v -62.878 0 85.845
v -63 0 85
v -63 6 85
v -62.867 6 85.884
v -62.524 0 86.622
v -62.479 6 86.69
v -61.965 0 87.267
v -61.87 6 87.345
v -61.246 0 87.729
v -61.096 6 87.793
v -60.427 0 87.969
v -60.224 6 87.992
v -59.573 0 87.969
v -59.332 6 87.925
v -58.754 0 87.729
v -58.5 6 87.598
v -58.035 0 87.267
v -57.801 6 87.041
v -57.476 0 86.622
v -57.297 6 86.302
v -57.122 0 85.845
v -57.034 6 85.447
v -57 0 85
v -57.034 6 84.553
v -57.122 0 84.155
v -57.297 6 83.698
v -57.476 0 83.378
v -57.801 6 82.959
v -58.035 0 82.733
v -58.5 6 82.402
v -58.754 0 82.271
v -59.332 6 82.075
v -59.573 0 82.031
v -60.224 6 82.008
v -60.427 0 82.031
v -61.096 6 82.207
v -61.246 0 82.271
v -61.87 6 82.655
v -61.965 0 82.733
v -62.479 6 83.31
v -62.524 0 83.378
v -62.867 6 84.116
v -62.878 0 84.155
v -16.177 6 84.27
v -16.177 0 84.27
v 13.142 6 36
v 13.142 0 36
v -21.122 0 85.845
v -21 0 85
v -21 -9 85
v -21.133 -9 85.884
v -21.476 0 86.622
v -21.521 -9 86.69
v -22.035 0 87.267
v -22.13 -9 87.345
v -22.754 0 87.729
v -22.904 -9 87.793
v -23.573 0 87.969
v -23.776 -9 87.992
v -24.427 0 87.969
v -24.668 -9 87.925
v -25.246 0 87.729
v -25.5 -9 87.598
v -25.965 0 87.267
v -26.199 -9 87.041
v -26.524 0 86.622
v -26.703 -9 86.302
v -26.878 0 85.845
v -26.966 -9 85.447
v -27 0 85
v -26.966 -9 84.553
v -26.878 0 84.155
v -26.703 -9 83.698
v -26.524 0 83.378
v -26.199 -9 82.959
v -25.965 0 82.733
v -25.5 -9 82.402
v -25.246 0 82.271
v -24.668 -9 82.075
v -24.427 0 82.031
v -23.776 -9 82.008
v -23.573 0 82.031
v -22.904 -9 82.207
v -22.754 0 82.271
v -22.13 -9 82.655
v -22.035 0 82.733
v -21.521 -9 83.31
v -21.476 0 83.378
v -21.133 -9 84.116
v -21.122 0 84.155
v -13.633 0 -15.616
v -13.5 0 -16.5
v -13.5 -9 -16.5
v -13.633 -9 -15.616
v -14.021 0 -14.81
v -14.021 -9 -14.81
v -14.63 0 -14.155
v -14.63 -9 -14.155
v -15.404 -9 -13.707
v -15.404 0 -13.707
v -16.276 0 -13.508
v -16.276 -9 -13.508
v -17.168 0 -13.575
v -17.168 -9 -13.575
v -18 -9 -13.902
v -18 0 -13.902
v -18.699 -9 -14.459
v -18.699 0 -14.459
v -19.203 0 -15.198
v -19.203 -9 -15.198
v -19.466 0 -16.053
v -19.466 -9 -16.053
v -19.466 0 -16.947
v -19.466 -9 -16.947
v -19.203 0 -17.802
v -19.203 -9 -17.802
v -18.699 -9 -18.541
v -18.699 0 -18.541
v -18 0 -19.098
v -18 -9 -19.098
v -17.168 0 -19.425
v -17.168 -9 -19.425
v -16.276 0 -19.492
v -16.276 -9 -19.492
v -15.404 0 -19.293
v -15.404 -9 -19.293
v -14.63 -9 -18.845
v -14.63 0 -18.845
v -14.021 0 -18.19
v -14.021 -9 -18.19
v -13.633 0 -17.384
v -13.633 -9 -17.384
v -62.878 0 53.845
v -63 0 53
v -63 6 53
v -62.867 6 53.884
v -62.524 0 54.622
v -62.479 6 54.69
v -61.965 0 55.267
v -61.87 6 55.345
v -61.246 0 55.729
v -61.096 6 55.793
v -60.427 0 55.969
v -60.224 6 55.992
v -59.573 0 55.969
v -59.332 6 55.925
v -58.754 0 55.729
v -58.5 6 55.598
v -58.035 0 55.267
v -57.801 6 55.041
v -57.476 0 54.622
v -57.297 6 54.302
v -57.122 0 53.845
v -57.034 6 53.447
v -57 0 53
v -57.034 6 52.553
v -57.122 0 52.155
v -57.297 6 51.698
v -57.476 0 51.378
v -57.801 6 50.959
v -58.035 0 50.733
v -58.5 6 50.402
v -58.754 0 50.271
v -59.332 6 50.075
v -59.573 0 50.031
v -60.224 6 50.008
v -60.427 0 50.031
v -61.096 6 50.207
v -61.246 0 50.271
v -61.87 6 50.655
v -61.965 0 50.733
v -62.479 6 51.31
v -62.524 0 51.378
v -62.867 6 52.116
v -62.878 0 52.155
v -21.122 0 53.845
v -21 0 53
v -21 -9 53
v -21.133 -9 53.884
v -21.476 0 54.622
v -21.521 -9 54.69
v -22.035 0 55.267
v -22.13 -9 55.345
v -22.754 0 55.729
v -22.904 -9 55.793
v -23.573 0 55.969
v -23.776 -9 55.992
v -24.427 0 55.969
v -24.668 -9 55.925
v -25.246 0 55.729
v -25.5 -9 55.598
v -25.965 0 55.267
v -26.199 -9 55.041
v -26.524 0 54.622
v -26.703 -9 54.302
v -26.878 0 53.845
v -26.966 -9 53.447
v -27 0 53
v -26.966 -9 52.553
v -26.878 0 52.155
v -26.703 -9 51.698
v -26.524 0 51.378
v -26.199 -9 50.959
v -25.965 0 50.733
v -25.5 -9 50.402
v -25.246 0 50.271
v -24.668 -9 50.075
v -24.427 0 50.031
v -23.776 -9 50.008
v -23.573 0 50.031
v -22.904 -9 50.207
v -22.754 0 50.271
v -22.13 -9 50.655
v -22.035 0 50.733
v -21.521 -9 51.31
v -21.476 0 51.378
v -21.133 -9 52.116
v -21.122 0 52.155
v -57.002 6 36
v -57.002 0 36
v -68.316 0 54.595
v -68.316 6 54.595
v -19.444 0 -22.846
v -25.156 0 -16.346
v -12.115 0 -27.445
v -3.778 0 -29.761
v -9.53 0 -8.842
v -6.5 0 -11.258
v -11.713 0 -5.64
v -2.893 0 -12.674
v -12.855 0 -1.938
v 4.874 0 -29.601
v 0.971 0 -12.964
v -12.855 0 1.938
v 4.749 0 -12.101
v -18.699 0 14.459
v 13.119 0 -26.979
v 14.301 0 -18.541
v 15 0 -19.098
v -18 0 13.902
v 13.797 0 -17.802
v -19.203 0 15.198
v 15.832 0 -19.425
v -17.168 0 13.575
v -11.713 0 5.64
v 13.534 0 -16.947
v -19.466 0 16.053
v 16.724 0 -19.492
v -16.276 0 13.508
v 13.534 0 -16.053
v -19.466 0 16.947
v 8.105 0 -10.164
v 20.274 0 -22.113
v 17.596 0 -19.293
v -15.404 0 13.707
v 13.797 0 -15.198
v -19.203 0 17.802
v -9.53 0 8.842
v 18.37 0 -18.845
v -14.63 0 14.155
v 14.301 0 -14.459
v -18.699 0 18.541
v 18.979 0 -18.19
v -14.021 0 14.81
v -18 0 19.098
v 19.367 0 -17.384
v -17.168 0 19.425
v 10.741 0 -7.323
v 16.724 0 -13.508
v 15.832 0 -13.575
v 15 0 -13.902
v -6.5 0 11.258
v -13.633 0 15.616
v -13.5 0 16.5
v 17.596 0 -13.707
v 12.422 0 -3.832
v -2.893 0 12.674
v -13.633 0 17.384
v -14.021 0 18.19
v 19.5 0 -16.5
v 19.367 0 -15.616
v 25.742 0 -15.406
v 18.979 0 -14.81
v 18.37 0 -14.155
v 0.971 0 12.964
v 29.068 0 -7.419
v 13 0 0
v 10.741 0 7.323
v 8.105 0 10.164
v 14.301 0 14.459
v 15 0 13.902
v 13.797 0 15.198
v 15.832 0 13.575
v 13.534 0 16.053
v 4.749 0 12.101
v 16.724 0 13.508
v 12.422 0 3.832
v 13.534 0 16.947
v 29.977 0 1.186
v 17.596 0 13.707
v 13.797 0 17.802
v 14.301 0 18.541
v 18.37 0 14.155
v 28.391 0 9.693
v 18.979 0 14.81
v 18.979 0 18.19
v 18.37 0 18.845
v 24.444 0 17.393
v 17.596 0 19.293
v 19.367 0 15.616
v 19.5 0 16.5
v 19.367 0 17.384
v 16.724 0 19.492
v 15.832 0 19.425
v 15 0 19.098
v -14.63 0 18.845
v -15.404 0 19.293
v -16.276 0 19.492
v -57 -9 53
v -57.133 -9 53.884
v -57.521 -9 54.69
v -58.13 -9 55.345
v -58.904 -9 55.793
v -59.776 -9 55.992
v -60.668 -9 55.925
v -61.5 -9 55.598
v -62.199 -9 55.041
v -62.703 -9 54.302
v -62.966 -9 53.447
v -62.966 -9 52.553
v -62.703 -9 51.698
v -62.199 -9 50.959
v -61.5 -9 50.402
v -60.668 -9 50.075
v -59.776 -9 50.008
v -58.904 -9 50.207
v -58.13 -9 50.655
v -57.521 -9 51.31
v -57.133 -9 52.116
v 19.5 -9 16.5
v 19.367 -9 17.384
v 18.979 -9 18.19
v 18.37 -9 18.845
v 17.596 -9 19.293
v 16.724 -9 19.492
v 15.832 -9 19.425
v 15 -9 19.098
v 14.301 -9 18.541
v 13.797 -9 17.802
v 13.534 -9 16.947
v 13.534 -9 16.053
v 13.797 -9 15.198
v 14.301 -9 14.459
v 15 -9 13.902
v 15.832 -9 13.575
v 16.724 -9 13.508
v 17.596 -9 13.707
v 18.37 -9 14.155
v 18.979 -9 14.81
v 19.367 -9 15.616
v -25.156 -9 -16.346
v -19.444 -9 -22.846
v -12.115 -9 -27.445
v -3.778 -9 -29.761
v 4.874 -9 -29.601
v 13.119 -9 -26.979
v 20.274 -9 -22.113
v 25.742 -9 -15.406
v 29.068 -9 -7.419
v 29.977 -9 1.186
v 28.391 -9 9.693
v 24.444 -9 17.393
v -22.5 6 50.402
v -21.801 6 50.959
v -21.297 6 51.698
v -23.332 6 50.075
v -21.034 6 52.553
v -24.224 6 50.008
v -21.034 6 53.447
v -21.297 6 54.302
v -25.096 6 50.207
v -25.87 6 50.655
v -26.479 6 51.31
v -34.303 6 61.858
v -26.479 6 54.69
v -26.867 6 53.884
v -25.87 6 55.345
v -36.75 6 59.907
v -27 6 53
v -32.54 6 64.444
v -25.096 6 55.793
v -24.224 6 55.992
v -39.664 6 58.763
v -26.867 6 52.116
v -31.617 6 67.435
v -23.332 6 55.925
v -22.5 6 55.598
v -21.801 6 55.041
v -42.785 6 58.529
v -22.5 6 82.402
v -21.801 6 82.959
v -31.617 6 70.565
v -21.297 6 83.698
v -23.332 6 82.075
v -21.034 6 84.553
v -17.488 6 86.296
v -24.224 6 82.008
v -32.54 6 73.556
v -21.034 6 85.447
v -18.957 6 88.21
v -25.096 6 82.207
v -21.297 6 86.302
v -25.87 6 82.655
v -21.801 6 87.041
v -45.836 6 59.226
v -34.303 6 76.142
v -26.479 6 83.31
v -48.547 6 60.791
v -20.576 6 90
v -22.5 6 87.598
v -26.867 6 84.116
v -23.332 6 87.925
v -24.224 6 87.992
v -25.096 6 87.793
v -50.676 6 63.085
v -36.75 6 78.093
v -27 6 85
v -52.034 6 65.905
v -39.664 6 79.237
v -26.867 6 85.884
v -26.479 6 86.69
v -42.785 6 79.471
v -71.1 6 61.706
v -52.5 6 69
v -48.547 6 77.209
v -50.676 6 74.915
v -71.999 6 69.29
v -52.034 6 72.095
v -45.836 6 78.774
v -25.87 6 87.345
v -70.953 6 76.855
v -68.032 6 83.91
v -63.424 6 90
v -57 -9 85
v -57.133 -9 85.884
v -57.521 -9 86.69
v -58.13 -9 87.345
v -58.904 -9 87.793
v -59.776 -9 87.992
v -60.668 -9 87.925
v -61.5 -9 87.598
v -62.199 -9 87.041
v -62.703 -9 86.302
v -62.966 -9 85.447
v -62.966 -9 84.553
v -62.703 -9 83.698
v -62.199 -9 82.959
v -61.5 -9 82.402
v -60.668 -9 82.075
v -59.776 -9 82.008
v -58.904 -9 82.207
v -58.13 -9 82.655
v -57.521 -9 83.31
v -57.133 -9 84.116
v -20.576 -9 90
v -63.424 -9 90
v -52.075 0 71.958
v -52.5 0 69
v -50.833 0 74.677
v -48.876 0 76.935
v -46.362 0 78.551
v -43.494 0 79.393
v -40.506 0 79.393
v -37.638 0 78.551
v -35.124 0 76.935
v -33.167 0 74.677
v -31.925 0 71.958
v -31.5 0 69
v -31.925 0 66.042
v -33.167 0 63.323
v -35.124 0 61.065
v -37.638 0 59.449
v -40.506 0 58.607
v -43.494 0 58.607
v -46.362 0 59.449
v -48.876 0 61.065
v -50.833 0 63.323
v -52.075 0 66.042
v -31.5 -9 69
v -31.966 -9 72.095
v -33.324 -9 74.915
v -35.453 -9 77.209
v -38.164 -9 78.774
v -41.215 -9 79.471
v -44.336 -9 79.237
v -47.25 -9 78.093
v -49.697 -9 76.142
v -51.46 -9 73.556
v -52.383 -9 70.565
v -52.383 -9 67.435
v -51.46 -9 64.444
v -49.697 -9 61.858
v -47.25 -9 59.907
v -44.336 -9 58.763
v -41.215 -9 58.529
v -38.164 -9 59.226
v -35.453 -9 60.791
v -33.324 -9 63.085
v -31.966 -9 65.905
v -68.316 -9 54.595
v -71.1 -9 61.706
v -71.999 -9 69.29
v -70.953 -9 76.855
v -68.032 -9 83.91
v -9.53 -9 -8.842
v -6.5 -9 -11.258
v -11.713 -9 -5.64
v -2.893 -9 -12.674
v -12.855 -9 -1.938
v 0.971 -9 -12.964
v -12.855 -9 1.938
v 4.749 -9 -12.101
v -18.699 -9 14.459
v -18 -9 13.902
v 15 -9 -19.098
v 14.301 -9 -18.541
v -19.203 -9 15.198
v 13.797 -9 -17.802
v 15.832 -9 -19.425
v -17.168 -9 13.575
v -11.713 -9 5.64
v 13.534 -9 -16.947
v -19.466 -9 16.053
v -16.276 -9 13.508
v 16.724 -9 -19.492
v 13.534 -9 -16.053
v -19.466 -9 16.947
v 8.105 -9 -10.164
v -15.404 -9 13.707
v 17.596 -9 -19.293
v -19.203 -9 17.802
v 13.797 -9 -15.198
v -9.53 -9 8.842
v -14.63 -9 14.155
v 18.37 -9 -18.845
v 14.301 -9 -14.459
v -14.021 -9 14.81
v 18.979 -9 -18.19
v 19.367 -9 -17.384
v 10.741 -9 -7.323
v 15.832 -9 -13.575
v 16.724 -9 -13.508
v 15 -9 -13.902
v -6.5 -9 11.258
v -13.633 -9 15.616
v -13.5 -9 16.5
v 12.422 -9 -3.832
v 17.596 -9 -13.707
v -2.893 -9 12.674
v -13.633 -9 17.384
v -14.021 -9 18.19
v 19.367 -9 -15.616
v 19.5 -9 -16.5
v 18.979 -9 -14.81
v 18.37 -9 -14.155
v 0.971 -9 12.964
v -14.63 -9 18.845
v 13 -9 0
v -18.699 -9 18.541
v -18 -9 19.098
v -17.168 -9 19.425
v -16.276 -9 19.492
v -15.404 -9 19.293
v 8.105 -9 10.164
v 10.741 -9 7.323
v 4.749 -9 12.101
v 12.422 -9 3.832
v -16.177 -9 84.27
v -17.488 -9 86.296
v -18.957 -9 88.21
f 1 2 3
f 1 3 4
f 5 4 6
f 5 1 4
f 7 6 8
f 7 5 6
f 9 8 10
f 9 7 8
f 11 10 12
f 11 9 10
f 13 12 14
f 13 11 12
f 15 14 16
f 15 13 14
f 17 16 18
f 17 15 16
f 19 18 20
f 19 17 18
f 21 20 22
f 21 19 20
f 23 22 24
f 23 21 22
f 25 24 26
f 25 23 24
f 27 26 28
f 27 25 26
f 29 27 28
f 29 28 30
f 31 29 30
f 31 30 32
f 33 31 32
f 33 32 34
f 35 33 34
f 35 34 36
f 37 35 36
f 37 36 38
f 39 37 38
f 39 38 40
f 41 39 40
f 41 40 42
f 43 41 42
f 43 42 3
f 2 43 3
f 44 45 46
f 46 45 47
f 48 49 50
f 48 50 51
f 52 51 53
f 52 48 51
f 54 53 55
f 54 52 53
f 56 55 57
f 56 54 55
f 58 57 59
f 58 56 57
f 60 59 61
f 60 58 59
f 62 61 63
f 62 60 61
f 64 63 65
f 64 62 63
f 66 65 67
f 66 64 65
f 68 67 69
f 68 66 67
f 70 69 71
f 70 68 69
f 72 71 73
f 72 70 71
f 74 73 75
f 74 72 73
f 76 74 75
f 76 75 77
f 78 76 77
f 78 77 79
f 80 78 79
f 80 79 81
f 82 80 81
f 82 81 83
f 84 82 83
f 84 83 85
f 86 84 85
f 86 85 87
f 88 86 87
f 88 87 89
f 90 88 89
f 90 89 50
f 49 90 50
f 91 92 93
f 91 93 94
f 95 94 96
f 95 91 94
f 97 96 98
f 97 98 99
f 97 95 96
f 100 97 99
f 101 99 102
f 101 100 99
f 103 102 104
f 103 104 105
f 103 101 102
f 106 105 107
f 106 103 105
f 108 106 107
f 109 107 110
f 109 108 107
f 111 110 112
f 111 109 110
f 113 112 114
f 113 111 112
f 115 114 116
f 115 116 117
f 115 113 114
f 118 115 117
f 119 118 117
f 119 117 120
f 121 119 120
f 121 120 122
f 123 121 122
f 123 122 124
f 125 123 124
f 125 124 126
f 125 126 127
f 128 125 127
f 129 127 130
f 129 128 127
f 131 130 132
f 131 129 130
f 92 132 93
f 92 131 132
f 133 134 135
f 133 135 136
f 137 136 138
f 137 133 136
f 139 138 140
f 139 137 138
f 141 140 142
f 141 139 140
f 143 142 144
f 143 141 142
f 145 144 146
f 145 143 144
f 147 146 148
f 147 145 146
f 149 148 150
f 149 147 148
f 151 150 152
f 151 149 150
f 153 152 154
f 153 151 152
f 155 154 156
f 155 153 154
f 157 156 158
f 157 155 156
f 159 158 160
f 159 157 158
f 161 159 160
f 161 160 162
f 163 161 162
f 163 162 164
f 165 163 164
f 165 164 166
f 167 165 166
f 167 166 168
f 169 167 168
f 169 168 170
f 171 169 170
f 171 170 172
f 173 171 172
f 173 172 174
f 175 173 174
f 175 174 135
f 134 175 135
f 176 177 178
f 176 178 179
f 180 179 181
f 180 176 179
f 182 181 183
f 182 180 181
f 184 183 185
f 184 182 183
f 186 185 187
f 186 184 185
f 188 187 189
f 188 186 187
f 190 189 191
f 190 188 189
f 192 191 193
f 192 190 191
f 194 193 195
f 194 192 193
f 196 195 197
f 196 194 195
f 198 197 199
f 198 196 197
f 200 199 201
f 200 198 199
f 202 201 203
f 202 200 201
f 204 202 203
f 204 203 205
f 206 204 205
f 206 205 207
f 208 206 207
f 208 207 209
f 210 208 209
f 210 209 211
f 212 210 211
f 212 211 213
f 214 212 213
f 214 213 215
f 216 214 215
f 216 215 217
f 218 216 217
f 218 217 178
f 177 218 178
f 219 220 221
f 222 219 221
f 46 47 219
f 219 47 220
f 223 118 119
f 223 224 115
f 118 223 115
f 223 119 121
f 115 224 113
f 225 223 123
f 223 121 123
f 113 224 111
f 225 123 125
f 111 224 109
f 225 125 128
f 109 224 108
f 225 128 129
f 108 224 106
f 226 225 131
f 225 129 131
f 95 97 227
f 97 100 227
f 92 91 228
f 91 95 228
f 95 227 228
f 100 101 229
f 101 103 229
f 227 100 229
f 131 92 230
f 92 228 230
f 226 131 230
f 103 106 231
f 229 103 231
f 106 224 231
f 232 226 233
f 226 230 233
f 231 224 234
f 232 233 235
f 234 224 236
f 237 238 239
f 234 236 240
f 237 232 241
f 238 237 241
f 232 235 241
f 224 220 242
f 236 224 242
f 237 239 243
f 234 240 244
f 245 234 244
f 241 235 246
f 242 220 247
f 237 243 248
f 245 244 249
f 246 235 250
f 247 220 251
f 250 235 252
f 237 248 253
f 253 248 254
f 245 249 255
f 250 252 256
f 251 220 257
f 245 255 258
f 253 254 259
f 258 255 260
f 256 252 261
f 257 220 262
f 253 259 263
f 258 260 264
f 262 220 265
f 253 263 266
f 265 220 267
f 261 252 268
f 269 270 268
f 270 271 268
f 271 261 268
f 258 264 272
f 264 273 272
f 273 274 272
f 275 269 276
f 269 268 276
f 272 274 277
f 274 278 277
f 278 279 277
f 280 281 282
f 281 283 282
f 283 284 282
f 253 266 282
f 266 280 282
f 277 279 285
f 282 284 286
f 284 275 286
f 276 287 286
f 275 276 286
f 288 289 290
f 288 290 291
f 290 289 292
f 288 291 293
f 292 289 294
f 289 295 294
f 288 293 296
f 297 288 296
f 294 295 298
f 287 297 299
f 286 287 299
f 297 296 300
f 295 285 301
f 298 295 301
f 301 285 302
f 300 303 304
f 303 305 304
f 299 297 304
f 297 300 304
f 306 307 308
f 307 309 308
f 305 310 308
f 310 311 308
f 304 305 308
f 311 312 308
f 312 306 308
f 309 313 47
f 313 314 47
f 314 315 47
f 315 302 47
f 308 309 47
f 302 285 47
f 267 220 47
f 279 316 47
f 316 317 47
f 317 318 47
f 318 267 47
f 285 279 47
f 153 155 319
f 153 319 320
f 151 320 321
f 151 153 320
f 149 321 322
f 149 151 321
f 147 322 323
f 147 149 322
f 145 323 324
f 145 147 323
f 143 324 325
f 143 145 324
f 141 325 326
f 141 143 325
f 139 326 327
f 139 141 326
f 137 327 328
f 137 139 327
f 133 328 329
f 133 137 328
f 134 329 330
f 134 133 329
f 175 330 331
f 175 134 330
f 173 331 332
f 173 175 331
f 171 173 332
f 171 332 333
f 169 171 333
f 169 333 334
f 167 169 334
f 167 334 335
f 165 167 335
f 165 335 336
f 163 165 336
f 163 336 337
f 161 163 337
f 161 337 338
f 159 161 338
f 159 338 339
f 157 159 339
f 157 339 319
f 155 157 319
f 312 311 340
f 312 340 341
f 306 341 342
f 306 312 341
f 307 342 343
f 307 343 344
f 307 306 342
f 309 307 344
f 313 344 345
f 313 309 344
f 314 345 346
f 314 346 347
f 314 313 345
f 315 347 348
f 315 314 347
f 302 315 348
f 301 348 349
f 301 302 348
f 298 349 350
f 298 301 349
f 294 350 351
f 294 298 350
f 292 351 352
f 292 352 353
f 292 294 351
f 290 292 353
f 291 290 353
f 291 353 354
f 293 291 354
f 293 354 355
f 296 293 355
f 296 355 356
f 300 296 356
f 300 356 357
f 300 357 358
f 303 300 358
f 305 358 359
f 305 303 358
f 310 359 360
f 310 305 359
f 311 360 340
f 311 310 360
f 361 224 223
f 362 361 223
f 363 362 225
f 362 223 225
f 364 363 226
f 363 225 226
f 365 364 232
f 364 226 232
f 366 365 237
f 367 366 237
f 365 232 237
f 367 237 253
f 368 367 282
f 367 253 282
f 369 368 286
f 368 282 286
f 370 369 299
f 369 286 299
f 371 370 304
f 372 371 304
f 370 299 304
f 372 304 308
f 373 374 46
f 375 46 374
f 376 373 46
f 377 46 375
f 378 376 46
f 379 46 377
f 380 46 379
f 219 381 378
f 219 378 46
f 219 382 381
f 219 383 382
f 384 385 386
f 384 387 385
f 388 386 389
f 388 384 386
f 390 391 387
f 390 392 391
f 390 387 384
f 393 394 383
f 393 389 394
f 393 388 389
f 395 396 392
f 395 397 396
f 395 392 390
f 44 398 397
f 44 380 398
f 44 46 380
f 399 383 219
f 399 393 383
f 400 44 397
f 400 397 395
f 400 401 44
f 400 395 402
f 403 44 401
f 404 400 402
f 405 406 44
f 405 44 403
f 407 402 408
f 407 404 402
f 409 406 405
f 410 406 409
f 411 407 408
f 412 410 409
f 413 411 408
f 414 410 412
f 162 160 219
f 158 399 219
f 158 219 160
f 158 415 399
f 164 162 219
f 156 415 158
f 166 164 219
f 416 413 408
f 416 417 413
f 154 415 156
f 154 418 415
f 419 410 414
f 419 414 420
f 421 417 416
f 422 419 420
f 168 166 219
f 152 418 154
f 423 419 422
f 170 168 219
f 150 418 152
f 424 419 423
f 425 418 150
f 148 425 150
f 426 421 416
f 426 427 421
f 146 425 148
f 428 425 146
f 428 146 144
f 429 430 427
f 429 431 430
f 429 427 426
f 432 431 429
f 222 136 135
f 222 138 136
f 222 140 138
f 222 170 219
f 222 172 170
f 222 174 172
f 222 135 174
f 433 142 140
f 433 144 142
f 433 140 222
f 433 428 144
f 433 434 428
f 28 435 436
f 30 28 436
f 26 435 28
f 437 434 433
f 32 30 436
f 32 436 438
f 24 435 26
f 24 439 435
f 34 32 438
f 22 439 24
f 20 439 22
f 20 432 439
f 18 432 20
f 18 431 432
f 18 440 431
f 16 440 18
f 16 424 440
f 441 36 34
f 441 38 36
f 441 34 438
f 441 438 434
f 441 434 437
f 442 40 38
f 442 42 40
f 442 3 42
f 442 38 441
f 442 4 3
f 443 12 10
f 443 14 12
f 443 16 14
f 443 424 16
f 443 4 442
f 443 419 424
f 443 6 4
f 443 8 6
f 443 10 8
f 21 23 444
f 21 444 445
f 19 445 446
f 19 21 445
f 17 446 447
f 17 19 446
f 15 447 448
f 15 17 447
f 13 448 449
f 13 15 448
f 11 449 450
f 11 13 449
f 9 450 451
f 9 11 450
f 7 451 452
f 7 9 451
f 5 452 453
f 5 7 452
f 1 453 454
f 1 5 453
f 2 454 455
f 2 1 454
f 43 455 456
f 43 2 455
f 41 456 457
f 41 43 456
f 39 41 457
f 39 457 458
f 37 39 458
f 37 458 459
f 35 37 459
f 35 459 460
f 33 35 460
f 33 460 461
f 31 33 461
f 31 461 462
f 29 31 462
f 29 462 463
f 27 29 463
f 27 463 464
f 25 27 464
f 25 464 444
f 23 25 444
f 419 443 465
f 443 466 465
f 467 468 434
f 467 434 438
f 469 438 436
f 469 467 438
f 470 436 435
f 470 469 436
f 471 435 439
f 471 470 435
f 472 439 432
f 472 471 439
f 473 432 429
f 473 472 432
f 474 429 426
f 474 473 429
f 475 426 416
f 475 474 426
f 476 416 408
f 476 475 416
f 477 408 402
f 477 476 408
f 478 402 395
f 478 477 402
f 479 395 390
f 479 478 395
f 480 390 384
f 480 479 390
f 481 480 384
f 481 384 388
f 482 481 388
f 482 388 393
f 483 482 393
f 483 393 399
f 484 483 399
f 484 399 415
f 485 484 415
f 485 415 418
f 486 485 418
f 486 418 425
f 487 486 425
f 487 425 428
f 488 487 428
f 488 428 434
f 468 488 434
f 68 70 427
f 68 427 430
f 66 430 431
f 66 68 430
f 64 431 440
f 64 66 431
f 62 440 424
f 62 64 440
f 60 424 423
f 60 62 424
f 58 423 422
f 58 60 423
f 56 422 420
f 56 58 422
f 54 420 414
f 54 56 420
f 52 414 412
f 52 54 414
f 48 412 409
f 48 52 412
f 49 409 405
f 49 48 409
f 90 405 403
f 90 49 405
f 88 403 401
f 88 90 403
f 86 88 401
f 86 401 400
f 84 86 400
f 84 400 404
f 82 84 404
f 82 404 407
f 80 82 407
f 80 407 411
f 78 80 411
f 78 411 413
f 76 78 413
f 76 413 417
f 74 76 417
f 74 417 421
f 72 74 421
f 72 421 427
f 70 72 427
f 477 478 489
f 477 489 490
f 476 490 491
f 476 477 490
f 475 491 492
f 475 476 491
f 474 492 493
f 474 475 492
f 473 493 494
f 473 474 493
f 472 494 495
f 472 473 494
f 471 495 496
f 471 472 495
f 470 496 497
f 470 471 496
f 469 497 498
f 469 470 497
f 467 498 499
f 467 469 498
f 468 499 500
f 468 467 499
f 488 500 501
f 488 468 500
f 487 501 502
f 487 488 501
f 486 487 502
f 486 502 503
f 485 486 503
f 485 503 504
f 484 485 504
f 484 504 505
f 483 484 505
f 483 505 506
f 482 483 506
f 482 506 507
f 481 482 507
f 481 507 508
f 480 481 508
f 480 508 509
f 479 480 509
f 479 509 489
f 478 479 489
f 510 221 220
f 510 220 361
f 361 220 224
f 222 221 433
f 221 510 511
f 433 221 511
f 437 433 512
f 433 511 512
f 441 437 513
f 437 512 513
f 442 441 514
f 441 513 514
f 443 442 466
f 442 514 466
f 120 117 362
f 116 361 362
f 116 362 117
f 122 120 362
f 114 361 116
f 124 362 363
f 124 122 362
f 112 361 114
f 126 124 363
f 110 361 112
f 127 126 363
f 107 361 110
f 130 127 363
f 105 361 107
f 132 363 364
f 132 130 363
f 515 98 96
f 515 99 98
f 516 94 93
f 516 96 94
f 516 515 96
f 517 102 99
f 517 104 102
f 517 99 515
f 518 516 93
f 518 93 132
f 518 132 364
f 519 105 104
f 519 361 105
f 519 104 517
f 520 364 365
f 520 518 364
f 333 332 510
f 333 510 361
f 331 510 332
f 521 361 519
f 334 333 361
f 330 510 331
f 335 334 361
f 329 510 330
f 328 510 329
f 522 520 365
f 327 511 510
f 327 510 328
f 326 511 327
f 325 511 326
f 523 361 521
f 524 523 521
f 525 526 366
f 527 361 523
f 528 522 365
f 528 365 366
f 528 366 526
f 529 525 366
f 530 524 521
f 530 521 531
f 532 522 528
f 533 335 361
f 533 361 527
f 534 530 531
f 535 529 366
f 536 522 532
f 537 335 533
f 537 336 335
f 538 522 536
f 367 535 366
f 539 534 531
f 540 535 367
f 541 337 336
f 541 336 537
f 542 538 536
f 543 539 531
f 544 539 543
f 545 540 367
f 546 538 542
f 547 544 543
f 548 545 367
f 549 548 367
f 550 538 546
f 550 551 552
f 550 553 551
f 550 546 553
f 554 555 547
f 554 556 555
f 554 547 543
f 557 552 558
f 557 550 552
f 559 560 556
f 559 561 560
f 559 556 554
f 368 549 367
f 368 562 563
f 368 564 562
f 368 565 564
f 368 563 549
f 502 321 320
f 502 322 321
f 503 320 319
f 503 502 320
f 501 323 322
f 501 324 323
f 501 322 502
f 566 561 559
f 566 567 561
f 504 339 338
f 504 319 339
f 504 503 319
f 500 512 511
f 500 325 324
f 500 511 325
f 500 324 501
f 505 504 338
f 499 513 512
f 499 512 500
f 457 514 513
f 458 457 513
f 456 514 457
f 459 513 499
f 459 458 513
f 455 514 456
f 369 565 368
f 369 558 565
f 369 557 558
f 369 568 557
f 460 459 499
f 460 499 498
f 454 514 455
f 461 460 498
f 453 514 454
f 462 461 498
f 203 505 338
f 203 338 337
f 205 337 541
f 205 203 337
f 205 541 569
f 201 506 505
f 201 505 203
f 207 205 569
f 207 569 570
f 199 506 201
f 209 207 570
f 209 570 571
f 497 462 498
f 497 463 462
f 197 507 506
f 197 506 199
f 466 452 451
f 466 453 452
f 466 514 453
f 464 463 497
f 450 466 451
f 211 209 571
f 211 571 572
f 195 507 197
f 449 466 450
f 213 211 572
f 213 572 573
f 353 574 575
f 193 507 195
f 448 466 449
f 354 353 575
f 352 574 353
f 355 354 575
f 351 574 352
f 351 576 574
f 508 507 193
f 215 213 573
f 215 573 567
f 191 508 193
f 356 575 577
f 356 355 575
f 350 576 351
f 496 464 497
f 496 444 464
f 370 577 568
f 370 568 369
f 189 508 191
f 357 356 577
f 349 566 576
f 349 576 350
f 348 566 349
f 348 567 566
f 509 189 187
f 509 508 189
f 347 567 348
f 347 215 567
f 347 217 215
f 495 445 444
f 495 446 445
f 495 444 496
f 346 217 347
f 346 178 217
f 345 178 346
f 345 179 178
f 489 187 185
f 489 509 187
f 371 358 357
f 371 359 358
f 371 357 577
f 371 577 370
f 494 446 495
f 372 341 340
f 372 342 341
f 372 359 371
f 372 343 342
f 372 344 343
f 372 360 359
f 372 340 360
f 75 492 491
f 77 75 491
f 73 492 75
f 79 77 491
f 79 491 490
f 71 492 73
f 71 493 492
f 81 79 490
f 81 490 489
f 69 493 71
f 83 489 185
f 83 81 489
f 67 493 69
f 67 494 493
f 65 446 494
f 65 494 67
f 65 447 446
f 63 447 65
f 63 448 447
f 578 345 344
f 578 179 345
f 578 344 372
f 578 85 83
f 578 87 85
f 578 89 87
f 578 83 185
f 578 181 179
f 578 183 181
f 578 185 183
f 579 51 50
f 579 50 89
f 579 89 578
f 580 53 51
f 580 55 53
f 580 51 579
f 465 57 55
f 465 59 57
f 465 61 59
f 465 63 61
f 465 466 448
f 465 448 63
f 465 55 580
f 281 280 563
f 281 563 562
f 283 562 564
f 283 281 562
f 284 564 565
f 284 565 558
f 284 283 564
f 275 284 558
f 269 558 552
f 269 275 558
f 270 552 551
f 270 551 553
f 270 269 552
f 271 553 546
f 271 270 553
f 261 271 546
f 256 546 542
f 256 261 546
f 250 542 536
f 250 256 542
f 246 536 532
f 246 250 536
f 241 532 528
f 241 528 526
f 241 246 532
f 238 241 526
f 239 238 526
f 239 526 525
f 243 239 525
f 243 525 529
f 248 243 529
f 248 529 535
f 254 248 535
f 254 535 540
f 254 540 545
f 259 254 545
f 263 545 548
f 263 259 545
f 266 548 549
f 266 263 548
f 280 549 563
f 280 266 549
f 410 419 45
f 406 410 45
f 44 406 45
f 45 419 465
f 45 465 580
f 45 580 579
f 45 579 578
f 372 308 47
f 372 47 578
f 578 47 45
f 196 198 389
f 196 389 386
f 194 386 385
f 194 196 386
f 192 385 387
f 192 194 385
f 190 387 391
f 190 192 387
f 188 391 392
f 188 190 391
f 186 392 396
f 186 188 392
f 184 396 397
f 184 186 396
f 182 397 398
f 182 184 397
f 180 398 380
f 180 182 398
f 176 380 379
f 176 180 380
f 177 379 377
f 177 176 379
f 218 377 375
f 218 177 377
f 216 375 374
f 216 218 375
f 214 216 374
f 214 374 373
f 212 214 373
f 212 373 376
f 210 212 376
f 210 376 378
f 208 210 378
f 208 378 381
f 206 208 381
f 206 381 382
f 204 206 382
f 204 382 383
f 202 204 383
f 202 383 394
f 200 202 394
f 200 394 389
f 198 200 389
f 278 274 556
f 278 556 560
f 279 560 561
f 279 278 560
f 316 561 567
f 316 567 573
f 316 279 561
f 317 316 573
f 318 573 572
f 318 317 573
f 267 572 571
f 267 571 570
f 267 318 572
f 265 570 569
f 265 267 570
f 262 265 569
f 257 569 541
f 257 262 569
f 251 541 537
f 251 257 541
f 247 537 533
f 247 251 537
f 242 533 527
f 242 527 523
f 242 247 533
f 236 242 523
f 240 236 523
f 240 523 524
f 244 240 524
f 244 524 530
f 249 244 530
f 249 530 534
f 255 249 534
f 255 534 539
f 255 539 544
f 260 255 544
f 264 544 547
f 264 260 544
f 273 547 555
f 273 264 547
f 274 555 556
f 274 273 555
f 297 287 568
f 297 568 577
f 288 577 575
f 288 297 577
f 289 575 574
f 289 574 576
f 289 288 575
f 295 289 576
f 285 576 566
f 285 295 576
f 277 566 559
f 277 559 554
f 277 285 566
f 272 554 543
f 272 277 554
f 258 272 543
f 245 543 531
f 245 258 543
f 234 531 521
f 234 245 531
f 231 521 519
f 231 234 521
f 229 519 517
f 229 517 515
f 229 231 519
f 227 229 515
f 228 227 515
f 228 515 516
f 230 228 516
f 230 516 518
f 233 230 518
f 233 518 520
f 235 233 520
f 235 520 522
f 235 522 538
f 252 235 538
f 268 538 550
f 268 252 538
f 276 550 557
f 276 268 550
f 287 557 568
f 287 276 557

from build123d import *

# Parameters (mm, degrees)
F0_R     = 3
F0_R_2   = 13
F0_R_3   = 10.5
F1_DEPTH = 9
F2_R     = 3
F2_R_2   = 10.5
F3_DEPTH = 6


with BuildPart() as f1:
    # F0 (on Front) → F1 (new body)
    with BuildSketch(Plane.XZ):
        with BuildLine():
            Line((-68.315586, 54.595489), (-25.15564, -16.346062))
            ThreePointArc((-25.15564, -16.346062), (16.873102, -24.80521), (24.443739, 17.392631))
            Line((24.443739, 17.392631), (-16.17679, 84.269638))
            ThreePointArc((-16.17679, 84.269638), (-18.203137, 87.267712), (-20.575715, 90))
            Line((-20.575715, 90), (-63.424285, 90))
            ThreePointArc((-63.424285, 90), (-71.717733, 73.105646), (-68.315586, 54.595489))
        make_face()
        with Locations((-16.5, -16.5)):
            Circle(F0_R, mode=Mode.SUBTRACT)
        with Locations((16.5, -16.5)):
            Circle(F0_R, mode=Mode.SUBTRACT)
        Circle(F0_R_2, mode=Mode.SUBTRACT)
        with Locations((-16.5, 16.5)):
            Circle(F0_R, mode=Mode.SUBTRACT)
        with Locations((16.5, 16.5)):
            Circle(F0_R, mode=Mode.SUBTRACT)
        with Locations((-60, 53)):
            Circle(F0_R, mode=Mode.SUBTRACT)
        with Locations((-24, 53)):
            Circle(F0_R, mode=Mode.SUBTRACT)
        with Locations((-60, 85)):
            Circle(F0_R, mode=Mode.SUBTRACT)
        with Locations((-42, 69)):
            Circle(F0_R_3, mode=Mode.SUBTRACT)
        with Locations((-24, 85)):
            Circle(F0_R, mode=Mode.SUBTRACT)
    extrude(amount=F1_DEPTH)

    # F2 (on face) → F3 (join)
    with BuildSketch(Plane(origin=(0, 0, 0), x_dir=(-1, 0, 0), z_dir=(0, 1, 0))):
        with BuildLine():
            Line((-13.14178, 36), (57.002325, 36))
            Line((57.002325, 36), (68.315586, 54.595489))
            ThreePointArc((68.315586, 54.595489), (71.717733, 73.105646), (63.424285, 90))
            Line((63.424285, 90), (20.575715, 90))
            ThreePointArc((20.575715, 90), (18.203137, 87.267712), (16.17679, 84.269638))
            Line((16.17679, 84.269638), (-13.14178, 36))
        make_face()
        with Locations((24, 53)):
            Circle(F2_R, mode=Mode.SUBTRACT)
        with Locations((60, 53)):
            Circle(F2_R, mode=Mode.SUBTRACT)
        with Locations((42, 69)):
            Circle(F2_R_2, mode=Mode.SUBTRACT)
        with Locations((24, 85)):
            Circle(F2_R, mode=Mode.SUBTRACT)
        with Locations((60, 85)):
            Circle(F2_R, mode=Mode.SUBTRACT)
    extrude(amount=F3_DEPTH)


solid = f1.part
